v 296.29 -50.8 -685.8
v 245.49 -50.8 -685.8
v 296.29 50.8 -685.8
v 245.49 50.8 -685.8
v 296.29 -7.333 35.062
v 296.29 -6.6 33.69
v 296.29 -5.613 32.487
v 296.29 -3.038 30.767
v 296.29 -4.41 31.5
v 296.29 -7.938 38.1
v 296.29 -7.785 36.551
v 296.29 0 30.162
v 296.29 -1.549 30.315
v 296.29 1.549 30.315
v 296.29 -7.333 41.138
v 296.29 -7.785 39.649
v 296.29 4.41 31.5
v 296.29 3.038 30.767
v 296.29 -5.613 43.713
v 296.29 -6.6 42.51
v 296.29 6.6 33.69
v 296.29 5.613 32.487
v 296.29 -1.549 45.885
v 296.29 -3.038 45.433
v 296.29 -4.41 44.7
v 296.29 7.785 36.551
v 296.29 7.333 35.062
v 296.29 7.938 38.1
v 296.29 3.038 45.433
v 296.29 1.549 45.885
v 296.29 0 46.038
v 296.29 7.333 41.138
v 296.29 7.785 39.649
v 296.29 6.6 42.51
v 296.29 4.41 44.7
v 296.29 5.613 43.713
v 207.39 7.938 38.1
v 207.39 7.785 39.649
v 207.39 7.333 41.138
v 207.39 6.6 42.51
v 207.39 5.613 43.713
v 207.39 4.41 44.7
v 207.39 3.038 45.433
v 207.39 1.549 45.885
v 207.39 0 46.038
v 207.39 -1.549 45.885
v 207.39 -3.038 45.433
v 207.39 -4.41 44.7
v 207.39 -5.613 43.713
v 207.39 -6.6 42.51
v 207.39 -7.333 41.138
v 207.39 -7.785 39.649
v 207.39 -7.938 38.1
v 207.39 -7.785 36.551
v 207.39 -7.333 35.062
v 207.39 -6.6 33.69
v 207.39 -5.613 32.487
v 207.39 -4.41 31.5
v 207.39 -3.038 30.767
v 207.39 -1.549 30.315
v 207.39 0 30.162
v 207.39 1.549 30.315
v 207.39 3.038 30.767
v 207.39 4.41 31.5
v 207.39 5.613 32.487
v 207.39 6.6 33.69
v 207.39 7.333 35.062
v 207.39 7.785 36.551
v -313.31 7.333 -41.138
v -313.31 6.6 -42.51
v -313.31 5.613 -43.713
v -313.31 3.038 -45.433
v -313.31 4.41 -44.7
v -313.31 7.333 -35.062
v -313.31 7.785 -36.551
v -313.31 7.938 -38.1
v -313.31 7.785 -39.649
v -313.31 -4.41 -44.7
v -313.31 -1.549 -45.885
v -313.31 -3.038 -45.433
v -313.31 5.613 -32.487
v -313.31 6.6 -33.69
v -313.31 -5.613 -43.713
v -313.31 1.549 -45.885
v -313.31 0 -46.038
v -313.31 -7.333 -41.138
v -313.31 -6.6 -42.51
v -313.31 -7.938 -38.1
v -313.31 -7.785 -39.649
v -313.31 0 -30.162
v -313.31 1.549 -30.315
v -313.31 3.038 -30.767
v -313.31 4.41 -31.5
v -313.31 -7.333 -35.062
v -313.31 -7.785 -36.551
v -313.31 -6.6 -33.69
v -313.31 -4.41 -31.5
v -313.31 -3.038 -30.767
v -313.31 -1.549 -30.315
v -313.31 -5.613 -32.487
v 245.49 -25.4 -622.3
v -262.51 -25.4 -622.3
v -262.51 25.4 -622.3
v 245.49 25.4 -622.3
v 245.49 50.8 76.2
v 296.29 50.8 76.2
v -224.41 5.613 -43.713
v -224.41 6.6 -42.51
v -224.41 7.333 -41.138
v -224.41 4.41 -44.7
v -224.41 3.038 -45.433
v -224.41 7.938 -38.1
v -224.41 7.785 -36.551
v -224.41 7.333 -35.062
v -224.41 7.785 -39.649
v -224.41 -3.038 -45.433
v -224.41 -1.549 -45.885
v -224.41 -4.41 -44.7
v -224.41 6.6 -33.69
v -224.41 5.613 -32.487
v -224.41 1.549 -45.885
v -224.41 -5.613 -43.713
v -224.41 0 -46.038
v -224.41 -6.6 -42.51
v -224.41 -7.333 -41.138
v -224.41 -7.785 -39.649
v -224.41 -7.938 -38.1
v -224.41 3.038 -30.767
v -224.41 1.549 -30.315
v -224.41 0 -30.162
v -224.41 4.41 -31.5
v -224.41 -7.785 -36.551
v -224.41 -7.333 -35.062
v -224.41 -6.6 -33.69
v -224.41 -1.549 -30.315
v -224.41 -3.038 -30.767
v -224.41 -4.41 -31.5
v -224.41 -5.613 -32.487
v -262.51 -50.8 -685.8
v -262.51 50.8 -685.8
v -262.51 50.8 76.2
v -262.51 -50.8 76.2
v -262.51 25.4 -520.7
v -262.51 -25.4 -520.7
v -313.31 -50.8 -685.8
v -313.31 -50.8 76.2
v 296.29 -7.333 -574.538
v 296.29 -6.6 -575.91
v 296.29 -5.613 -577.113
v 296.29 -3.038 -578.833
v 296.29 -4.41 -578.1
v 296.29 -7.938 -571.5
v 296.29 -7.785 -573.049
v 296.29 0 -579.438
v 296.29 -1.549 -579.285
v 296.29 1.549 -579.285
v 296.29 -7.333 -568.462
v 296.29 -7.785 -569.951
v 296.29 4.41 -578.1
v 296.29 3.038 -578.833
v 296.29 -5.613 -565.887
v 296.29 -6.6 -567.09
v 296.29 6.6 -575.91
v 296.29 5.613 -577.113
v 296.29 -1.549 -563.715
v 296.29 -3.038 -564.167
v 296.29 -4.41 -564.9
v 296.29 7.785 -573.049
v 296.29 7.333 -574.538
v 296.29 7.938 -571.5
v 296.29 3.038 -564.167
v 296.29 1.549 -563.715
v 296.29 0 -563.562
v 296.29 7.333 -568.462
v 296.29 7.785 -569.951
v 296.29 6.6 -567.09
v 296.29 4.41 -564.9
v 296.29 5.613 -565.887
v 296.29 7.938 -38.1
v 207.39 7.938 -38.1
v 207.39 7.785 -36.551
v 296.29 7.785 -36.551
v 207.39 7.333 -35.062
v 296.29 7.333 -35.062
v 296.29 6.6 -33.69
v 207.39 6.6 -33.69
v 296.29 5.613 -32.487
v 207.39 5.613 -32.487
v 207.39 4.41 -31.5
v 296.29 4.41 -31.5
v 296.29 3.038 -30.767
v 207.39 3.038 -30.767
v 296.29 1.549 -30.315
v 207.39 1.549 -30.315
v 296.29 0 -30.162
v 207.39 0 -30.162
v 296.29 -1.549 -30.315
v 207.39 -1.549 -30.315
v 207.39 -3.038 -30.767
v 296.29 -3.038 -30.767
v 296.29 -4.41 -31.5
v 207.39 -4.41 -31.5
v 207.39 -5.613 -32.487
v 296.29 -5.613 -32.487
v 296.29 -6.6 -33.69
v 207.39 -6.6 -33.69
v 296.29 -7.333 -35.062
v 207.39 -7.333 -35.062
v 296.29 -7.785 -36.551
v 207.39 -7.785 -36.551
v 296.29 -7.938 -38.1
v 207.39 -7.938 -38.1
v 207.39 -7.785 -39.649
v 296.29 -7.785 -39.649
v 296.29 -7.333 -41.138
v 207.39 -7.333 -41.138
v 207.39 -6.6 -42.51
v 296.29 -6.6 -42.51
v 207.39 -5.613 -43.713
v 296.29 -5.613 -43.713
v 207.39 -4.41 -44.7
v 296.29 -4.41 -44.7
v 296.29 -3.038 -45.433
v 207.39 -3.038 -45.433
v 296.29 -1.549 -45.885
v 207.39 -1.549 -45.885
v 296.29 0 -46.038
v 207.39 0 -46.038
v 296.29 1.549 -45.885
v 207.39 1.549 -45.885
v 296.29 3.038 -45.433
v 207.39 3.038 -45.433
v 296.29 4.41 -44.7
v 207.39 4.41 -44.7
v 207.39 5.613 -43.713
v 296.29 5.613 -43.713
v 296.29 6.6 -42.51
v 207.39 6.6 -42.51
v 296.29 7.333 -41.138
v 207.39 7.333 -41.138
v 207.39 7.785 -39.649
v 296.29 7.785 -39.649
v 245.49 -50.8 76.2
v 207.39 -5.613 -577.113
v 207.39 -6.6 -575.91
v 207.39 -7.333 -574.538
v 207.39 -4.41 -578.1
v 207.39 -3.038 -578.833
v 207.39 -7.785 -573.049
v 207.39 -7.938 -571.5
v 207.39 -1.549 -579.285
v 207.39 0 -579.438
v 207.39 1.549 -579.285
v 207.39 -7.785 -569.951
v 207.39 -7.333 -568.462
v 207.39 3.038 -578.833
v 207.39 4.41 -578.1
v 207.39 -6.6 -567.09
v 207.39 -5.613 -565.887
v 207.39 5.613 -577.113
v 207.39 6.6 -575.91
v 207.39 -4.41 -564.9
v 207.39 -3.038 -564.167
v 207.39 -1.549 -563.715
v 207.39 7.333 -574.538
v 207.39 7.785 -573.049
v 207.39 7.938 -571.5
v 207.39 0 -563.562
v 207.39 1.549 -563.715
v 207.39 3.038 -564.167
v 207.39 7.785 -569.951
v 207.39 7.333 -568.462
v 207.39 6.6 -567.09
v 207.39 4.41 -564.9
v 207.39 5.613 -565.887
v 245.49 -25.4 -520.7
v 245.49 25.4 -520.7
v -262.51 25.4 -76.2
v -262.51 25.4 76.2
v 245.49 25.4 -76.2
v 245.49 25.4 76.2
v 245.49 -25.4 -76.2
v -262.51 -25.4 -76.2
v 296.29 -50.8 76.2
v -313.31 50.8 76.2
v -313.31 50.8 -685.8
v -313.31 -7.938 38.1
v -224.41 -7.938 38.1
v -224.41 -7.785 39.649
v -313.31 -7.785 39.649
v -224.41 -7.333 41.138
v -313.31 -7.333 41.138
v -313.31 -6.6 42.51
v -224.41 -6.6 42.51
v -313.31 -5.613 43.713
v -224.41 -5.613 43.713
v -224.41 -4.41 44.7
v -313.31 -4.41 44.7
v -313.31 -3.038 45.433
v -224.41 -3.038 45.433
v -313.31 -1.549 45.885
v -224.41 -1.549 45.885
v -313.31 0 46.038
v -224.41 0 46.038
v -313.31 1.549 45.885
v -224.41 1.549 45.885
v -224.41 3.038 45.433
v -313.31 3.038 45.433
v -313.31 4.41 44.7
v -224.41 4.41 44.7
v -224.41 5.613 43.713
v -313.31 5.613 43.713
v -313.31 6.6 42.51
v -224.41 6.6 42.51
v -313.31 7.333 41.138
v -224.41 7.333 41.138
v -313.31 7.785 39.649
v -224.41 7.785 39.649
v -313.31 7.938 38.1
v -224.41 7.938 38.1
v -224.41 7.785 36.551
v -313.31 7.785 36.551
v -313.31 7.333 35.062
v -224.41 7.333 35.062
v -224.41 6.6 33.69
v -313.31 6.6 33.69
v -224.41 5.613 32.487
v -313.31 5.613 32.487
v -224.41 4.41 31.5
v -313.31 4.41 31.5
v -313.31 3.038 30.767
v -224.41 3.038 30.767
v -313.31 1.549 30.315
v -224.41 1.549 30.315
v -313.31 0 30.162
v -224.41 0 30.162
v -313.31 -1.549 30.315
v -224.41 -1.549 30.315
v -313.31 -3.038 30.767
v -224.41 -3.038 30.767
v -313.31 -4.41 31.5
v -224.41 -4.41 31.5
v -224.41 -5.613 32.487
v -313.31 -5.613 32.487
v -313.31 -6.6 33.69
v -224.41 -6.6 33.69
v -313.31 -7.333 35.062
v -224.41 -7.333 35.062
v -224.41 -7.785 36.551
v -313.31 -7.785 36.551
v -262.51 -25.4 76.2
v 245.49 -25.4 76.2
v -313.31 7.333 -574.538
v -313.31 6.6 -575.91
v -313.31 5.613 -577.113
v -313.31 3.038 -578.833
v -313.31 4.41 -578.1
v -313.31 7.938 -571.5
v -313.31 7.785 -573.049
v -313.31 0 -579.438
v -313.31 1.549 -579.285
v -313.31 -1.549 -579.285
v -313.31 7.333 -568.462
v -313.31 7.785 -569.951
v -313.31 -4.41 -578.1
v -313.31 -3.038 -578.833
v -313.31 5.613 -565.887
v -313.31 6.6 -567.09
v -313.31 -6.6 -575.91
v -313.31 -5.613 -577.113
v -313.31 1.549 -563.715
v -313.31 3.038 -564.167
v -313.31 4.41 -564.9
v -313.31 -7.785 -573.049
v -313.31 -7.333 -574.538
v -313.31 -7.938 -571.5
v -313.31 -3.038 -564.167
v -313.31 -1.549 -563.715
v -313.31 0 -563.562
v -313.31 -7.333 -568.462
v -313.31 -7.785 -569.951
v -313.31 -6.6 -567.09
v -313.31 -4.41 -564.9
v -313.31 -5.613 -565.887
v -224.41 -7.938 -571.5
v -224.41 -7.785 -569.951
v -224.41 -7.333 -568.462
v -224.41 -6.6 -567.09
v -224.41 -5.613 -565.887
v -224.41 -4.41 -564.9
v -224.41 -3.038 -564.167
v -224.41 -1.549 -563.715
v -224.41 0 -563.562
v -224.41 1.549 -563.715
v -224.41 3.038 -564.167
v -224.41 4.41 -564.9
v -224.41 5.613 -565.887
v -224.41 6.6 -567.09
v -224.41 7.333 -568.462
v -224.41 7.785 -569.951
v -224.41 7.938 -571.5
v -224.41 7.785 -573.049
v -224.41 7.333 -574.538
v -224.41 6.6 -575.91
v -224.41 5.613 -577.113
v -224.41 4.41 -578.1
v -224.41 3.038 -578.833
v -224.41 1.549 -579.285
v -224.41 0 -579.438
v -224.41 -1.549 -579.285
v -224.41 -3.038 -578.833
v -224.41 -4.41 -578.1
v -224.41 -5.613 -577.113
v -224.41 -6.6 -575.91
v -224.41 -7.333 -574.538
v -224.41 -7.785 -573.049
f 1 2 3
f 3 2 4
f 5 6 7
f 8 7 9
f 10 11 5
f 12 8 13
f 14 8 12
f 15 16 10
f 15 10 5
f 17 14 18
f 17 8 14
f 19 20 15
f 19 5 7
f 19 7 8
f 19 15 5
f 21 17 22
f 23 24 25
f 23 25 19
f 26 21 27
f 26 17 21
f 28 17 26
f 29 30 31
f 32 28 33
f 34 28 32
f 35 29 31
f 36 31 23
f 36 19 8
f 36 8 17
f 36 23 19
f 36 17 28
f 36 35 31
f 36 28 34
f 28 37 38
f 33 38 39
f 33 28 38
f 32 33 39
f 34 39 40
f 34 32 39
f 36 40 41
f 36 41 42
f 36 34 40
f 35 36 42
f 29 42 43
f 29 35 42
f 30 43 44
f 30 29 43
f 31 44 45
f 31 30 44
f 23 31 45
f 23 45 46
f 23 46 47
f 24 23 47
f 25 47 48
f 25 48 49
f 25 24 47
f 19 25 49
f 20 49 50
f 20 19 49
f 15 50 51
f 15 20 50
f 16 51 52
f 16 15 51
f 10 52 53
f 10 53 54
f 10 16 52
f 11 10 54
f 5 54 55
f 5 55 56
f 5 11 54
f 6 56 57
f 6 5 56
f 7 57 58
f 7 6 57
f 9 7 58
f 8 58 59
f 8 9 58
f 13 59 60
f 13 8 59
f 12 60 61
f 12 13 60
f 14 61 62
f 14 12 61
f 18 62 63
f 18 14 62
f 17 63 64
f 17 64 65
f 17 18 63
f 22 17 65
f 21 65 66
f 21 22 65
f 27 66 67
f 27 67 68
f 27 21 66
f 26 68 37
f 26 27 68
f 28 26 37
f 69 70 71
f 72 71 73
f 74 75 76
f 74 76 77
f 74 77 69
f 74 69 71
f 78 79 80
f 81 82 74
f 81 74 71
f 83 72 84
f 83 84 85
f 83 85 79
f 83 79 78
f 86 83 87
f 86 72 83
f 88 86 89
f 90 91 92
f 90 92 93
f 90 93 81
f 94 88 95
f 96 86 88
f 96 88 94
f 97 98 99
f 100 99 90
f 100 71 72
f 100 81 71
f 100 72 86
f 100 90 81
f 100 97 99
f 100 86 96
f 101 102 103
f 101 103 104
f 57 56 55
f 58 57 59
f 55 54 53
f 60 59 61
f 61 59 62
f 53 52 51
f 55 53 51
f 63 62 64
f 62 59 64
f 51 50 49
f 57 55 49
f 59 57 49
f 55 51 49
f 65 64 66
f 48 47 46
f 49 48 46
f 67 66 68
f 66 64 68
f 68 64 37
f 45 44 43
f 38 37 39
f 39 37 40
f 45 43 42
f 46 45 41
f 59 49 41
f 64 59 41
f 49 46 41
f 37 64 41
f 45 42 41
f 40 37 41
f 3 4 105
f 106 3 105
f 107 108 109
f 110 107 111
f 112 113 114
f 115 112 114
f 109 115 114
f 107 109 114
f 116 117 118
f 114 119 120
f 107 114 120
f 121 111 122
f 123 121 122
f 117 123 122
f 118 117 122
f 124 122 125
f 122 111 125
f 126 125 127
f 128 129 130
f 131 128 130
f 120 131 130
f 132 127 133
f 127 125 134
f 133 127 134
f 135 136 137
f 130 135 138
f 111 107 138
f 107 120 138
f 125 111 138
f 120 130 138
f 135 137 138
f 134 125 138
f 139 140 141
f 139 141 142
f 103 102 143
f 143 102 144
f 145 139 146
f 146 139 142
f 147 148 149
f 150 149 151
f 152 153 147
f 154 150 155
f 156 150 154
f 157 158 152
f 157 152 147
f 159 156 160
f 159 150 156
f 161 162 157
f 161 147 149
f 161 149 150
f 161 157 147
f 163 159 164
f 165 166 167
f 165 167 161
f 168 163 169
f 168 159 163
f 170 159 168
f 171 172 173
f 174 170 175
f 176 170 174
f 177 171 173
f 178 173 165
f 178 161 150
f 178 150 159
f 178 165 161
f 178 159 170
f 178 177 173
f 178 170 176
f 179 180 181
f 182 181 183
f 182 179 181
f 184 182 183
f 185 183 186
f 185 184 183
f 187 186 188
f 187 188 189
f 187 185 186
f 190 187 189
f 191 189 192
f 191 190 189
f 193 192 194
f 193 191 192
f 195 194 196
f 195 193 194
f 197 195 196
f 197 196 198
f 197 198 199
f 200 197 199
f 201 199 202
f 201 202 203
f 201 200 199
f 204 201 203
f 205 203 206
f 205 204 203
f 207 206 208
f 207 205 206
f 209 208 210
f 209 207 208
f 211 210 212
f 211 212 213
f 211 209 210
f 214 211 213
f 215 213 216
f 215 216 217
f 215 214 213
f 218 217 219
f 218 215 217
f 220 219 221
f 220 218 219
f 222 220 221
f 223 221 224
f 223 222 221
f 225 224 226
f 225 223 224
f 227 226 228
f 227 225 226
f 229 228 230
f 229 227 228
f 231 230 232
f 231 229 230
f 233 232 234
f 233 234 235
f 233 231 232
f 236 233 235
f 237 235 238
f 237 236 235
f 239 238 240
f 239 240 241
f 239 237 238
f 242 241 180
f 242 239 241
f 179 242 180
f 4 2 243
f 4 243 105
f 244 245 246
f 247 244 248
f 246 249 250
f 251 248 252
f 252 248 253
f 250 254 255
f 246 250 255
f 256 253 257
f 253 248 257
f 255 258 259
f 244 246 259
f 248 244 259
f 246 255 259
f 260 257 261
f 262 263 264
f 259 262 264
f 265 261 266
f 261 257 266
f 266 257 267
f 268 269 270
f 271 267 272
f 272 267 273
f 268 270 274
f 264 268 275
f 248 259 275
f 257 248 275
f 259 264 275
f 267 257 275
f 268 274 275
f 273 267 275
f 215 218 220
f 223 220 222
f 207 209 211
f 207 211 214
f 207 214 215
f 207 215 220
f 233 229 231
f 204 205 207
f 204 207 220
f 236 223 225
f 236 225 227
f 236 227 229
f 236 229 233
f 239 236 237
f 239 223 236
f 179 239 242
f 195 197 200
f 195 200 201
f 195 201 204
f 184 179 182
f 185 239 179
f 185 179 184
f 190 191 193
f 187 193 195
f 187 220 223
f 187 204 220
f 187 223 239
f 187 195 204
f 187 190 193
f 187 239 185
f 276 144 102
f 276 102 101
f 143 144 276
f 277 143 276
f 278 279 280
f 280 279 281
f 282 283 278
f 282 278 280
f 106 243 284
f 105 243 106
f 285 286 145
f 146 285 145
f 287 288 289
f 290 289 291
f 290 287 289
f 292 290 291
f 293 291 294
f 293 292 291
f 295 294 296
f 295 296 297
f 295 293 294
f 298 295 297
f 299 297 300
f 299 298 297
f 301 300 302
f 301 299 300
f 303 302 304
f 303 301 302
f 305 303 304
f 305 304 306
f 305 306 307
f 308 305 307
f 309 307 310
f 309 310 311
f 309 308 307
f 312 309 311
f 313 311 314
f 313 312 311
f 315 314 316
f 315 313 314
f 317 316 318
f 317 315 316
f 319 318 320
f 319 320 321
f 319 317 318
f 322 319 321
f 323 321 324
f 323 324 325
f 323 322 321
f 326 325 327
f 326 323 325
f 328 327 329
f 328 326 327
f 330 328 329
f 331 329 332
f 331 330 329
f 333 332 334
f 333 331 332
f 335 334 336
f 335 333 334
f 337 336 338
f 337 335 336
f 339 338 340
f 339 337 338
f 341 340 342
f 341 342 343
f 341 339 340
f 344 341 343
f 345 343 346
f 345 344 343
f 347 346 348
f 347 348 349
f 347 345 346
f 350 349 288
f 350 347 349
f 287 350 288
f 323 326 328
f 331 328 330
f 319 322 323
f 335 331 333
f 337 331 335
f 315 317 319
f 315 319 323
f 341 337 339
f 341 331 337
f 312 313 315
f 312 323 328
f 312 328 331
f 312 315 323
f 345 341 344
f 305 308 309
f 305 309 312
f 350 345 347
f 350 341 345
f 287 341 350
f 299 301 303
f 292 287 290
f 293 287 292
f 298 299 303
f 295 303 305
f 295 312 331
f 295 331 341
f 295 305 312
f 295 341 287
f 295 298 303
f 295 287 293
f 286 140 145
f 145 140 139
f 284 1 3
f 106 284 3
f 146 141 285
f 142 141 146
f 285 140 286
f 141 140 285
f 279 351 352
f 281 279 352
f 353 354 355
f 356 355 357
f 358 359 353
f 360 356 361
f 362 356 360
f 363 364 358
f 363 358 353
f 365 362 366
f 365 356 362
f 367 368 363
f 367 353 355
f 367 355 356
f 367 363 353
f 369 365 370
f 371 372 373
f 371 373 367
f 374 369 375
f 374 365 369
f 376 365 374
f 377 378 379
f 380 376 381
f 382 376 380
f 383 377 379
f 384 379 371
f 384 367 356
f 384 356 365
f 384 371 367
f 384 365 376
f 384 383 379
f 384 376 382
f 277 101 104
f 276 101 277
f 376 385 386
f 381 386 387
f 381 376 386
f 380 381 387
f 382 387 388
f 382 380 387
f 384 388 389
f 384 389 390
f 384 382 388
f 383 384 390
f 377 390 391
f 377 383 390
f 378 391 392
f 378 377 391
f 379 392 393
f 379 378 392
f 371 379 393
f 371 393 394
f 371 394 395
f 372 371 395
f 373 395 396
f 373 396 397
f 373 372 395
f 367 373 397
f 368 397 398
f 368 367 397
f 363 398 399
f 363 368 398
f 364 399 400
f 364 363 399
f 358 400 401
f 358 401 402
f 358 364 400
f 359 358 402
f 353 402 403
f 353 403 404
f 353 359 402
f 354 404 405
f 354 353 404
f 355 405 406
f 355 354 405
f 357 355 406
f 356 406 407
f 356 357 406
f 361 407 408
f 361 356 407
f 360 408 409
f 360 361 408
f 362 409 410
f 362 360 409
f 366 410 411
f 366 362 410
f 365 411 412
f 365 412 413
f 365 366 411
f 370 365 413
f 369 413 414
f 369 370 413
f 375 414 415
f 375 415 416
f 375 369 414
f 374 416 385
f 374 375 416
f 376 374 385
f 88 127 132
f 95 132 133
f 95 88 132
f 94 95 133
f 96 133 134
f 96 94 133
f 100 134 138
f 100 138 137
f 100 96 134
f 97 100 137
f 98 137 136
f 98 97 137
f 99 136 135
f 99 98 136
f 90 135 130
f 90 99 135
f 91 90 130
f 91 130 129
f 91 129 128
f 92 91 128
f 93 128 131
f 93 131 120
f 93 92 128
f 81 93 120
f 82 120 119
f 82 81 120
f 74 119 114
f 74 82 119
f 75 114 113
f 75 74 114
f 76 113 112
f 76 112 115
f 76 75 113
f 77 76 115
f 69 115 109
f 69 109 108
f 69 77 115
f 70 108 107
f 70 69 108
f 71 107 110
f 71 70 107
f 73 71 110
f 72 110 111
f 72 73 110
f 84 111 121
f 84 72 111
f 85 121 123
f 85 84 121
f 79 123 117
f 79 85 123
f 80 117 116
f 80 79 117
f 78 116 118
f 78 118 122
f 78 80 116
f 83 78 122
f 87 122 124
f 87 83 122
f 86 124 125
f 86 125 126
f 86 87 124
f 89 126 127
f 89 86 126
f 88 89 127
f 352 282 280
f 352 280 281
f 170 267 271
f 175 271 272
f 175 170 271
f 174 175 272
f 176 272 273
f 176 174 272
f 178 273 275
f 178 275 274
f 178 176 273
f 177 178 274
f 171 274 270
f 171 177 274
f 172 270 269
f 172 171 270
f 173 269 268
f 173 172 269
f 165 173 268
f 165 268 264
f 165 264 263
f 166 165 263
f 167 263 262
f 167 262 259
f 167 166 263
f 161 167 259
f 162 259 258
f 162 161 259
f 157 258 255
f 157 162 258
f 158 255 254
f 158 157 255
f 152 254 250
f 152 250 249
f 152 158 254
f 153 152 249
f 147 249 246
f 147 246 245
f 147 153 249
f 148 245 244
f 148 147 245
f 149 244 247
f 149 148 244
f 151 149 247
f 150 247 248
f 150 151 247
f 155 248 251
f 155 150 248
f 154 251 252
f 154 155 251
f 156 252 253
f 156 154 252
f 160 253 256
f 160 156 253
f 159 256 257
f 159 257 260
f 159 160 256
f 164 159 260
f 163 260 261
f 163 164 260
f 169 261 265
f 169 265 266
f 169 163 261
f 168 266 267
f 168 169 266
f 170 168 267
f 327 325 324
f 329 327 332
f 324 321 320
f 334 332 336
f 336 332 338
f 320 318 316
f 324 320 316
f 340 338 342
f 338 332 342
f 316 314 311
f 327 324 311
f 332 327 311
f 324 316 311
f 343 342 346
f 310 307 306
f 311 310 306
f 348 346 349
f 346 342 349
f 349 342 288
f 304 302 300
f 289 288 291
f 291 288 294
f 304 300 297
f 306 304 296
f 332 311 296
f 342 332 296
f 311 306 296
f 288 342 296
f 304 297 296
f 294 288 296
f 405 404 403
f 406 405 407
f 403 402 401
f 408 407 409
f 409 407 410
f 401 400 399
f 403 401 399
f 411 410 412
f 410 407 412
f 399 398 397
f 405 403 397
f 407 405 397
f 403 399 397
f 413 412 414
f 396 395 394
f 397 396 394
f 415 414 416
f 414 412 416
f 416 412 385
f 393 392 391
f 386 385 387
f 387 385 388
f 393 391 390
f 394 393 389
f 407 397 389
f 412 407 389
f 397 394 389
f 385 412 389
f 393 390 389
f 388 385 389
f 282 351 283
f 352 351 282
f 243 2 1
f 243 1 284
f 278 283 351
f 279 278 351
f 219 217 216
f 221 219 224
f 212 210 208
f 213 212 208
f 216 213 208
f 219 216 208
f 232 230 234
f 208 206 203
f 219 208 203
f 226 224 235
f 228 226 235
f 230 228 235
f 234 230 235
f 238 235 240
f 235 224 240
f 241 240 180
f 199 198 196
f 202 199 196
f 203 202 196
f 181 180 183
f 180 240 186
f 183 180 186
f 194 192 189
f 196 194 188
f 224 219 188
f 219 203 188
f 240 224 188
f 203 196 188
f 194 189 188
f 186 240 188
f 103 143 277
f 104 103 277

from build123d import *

# Parameters (mm, degrees)
F1_W      = 508
F1_H      = 152.4
F2_DEPTH  = 50.8
F3_W      = 101.6
F3_H      = 762
F4_DEPTH  = 50.8
F5_W      = 101.6
F5_H      = 762
F6_DEPTH  = 50.8
F8_W      = 508
F8_H      = 101.6
F9_DEPTH  = 50.8
F10_R     = 7.9375
F11_DEPTH = 88.9
F12_R     = 7.9375
F13_DEPTH = 88.9


with BuildPart() as f2:
    # F1 (on offset) → F2 (new body)
    with BuildSketch(Plane.XZ.offset(25.4)):
        with Locations((-8.510292, 0)):
            Rectangle(F1_W, F1_H)
    extrude(amount=-F2_DEPTH)


with BuildPart() as f4:
    # F3 (on face) → F4 (new body)
    with BuildSketch(Plane(origin=(-262.510292, 0, 0), x_dir=(0, -1, 0), z_dir=(-1, 0, 0))):
        with Locations((0, -304.8)):
            Rectangle(F3_W, F3_H)
    extrude(amount=F4_DEPTH)


with BuildPart() as f6:
    # F5 (on face) → F6 (new body)
    with BuildSketch(Plane.YZ.offset(245.489708)):
        with Locations((0, -304.8)):
            Rectangle(F5_W, F5_H)
    extrude(amount=F6_DEPTH)


with BuildPart() as f9:
    # F8 (on offset) → F9 (new body)
    with BuildSketch(Plane.XZ.offset(25.4)):
        with Locations((-8.510292, -571.5)):
            Rectangle(F8_W, F8_H)
    extrude(amount=-F9_DEPTH)


with BuildPart() as f11:
    # F10 (on face) → F11 (new body)
    with BuildSketch(Plane.YZ.offset(296.289708)):
        with Locations((0, 38.1)):
            Circle(F10_R)
        with Locations((0, -38.1)):
            Circle(F10_R)
        with Locations((0, -571.5)):
            Circle(F10_R)
    extrude(amount=-F11_DEPTH)


with BuildPart() as f13:
    # F12 (on face) → F13 (new body)
    with BuildSketch(Plane(origin=(-313.310292, 0, 0), x_dir=(0, -1, 0), z_dir=(-1, 0, 0))):
        with Locations((0, 38.1)):
            Circle(F12_R)
        with Locations((0, -38.1)):
            Circle(F12_R)
        with Locations((0, -571.5)):
            Circle(F12_R)
    extrude(amount=-F13_DEPTH)


solid = Compound([f2.part, f4.part, f6.part, f9.part, f11.part, f13.part])
